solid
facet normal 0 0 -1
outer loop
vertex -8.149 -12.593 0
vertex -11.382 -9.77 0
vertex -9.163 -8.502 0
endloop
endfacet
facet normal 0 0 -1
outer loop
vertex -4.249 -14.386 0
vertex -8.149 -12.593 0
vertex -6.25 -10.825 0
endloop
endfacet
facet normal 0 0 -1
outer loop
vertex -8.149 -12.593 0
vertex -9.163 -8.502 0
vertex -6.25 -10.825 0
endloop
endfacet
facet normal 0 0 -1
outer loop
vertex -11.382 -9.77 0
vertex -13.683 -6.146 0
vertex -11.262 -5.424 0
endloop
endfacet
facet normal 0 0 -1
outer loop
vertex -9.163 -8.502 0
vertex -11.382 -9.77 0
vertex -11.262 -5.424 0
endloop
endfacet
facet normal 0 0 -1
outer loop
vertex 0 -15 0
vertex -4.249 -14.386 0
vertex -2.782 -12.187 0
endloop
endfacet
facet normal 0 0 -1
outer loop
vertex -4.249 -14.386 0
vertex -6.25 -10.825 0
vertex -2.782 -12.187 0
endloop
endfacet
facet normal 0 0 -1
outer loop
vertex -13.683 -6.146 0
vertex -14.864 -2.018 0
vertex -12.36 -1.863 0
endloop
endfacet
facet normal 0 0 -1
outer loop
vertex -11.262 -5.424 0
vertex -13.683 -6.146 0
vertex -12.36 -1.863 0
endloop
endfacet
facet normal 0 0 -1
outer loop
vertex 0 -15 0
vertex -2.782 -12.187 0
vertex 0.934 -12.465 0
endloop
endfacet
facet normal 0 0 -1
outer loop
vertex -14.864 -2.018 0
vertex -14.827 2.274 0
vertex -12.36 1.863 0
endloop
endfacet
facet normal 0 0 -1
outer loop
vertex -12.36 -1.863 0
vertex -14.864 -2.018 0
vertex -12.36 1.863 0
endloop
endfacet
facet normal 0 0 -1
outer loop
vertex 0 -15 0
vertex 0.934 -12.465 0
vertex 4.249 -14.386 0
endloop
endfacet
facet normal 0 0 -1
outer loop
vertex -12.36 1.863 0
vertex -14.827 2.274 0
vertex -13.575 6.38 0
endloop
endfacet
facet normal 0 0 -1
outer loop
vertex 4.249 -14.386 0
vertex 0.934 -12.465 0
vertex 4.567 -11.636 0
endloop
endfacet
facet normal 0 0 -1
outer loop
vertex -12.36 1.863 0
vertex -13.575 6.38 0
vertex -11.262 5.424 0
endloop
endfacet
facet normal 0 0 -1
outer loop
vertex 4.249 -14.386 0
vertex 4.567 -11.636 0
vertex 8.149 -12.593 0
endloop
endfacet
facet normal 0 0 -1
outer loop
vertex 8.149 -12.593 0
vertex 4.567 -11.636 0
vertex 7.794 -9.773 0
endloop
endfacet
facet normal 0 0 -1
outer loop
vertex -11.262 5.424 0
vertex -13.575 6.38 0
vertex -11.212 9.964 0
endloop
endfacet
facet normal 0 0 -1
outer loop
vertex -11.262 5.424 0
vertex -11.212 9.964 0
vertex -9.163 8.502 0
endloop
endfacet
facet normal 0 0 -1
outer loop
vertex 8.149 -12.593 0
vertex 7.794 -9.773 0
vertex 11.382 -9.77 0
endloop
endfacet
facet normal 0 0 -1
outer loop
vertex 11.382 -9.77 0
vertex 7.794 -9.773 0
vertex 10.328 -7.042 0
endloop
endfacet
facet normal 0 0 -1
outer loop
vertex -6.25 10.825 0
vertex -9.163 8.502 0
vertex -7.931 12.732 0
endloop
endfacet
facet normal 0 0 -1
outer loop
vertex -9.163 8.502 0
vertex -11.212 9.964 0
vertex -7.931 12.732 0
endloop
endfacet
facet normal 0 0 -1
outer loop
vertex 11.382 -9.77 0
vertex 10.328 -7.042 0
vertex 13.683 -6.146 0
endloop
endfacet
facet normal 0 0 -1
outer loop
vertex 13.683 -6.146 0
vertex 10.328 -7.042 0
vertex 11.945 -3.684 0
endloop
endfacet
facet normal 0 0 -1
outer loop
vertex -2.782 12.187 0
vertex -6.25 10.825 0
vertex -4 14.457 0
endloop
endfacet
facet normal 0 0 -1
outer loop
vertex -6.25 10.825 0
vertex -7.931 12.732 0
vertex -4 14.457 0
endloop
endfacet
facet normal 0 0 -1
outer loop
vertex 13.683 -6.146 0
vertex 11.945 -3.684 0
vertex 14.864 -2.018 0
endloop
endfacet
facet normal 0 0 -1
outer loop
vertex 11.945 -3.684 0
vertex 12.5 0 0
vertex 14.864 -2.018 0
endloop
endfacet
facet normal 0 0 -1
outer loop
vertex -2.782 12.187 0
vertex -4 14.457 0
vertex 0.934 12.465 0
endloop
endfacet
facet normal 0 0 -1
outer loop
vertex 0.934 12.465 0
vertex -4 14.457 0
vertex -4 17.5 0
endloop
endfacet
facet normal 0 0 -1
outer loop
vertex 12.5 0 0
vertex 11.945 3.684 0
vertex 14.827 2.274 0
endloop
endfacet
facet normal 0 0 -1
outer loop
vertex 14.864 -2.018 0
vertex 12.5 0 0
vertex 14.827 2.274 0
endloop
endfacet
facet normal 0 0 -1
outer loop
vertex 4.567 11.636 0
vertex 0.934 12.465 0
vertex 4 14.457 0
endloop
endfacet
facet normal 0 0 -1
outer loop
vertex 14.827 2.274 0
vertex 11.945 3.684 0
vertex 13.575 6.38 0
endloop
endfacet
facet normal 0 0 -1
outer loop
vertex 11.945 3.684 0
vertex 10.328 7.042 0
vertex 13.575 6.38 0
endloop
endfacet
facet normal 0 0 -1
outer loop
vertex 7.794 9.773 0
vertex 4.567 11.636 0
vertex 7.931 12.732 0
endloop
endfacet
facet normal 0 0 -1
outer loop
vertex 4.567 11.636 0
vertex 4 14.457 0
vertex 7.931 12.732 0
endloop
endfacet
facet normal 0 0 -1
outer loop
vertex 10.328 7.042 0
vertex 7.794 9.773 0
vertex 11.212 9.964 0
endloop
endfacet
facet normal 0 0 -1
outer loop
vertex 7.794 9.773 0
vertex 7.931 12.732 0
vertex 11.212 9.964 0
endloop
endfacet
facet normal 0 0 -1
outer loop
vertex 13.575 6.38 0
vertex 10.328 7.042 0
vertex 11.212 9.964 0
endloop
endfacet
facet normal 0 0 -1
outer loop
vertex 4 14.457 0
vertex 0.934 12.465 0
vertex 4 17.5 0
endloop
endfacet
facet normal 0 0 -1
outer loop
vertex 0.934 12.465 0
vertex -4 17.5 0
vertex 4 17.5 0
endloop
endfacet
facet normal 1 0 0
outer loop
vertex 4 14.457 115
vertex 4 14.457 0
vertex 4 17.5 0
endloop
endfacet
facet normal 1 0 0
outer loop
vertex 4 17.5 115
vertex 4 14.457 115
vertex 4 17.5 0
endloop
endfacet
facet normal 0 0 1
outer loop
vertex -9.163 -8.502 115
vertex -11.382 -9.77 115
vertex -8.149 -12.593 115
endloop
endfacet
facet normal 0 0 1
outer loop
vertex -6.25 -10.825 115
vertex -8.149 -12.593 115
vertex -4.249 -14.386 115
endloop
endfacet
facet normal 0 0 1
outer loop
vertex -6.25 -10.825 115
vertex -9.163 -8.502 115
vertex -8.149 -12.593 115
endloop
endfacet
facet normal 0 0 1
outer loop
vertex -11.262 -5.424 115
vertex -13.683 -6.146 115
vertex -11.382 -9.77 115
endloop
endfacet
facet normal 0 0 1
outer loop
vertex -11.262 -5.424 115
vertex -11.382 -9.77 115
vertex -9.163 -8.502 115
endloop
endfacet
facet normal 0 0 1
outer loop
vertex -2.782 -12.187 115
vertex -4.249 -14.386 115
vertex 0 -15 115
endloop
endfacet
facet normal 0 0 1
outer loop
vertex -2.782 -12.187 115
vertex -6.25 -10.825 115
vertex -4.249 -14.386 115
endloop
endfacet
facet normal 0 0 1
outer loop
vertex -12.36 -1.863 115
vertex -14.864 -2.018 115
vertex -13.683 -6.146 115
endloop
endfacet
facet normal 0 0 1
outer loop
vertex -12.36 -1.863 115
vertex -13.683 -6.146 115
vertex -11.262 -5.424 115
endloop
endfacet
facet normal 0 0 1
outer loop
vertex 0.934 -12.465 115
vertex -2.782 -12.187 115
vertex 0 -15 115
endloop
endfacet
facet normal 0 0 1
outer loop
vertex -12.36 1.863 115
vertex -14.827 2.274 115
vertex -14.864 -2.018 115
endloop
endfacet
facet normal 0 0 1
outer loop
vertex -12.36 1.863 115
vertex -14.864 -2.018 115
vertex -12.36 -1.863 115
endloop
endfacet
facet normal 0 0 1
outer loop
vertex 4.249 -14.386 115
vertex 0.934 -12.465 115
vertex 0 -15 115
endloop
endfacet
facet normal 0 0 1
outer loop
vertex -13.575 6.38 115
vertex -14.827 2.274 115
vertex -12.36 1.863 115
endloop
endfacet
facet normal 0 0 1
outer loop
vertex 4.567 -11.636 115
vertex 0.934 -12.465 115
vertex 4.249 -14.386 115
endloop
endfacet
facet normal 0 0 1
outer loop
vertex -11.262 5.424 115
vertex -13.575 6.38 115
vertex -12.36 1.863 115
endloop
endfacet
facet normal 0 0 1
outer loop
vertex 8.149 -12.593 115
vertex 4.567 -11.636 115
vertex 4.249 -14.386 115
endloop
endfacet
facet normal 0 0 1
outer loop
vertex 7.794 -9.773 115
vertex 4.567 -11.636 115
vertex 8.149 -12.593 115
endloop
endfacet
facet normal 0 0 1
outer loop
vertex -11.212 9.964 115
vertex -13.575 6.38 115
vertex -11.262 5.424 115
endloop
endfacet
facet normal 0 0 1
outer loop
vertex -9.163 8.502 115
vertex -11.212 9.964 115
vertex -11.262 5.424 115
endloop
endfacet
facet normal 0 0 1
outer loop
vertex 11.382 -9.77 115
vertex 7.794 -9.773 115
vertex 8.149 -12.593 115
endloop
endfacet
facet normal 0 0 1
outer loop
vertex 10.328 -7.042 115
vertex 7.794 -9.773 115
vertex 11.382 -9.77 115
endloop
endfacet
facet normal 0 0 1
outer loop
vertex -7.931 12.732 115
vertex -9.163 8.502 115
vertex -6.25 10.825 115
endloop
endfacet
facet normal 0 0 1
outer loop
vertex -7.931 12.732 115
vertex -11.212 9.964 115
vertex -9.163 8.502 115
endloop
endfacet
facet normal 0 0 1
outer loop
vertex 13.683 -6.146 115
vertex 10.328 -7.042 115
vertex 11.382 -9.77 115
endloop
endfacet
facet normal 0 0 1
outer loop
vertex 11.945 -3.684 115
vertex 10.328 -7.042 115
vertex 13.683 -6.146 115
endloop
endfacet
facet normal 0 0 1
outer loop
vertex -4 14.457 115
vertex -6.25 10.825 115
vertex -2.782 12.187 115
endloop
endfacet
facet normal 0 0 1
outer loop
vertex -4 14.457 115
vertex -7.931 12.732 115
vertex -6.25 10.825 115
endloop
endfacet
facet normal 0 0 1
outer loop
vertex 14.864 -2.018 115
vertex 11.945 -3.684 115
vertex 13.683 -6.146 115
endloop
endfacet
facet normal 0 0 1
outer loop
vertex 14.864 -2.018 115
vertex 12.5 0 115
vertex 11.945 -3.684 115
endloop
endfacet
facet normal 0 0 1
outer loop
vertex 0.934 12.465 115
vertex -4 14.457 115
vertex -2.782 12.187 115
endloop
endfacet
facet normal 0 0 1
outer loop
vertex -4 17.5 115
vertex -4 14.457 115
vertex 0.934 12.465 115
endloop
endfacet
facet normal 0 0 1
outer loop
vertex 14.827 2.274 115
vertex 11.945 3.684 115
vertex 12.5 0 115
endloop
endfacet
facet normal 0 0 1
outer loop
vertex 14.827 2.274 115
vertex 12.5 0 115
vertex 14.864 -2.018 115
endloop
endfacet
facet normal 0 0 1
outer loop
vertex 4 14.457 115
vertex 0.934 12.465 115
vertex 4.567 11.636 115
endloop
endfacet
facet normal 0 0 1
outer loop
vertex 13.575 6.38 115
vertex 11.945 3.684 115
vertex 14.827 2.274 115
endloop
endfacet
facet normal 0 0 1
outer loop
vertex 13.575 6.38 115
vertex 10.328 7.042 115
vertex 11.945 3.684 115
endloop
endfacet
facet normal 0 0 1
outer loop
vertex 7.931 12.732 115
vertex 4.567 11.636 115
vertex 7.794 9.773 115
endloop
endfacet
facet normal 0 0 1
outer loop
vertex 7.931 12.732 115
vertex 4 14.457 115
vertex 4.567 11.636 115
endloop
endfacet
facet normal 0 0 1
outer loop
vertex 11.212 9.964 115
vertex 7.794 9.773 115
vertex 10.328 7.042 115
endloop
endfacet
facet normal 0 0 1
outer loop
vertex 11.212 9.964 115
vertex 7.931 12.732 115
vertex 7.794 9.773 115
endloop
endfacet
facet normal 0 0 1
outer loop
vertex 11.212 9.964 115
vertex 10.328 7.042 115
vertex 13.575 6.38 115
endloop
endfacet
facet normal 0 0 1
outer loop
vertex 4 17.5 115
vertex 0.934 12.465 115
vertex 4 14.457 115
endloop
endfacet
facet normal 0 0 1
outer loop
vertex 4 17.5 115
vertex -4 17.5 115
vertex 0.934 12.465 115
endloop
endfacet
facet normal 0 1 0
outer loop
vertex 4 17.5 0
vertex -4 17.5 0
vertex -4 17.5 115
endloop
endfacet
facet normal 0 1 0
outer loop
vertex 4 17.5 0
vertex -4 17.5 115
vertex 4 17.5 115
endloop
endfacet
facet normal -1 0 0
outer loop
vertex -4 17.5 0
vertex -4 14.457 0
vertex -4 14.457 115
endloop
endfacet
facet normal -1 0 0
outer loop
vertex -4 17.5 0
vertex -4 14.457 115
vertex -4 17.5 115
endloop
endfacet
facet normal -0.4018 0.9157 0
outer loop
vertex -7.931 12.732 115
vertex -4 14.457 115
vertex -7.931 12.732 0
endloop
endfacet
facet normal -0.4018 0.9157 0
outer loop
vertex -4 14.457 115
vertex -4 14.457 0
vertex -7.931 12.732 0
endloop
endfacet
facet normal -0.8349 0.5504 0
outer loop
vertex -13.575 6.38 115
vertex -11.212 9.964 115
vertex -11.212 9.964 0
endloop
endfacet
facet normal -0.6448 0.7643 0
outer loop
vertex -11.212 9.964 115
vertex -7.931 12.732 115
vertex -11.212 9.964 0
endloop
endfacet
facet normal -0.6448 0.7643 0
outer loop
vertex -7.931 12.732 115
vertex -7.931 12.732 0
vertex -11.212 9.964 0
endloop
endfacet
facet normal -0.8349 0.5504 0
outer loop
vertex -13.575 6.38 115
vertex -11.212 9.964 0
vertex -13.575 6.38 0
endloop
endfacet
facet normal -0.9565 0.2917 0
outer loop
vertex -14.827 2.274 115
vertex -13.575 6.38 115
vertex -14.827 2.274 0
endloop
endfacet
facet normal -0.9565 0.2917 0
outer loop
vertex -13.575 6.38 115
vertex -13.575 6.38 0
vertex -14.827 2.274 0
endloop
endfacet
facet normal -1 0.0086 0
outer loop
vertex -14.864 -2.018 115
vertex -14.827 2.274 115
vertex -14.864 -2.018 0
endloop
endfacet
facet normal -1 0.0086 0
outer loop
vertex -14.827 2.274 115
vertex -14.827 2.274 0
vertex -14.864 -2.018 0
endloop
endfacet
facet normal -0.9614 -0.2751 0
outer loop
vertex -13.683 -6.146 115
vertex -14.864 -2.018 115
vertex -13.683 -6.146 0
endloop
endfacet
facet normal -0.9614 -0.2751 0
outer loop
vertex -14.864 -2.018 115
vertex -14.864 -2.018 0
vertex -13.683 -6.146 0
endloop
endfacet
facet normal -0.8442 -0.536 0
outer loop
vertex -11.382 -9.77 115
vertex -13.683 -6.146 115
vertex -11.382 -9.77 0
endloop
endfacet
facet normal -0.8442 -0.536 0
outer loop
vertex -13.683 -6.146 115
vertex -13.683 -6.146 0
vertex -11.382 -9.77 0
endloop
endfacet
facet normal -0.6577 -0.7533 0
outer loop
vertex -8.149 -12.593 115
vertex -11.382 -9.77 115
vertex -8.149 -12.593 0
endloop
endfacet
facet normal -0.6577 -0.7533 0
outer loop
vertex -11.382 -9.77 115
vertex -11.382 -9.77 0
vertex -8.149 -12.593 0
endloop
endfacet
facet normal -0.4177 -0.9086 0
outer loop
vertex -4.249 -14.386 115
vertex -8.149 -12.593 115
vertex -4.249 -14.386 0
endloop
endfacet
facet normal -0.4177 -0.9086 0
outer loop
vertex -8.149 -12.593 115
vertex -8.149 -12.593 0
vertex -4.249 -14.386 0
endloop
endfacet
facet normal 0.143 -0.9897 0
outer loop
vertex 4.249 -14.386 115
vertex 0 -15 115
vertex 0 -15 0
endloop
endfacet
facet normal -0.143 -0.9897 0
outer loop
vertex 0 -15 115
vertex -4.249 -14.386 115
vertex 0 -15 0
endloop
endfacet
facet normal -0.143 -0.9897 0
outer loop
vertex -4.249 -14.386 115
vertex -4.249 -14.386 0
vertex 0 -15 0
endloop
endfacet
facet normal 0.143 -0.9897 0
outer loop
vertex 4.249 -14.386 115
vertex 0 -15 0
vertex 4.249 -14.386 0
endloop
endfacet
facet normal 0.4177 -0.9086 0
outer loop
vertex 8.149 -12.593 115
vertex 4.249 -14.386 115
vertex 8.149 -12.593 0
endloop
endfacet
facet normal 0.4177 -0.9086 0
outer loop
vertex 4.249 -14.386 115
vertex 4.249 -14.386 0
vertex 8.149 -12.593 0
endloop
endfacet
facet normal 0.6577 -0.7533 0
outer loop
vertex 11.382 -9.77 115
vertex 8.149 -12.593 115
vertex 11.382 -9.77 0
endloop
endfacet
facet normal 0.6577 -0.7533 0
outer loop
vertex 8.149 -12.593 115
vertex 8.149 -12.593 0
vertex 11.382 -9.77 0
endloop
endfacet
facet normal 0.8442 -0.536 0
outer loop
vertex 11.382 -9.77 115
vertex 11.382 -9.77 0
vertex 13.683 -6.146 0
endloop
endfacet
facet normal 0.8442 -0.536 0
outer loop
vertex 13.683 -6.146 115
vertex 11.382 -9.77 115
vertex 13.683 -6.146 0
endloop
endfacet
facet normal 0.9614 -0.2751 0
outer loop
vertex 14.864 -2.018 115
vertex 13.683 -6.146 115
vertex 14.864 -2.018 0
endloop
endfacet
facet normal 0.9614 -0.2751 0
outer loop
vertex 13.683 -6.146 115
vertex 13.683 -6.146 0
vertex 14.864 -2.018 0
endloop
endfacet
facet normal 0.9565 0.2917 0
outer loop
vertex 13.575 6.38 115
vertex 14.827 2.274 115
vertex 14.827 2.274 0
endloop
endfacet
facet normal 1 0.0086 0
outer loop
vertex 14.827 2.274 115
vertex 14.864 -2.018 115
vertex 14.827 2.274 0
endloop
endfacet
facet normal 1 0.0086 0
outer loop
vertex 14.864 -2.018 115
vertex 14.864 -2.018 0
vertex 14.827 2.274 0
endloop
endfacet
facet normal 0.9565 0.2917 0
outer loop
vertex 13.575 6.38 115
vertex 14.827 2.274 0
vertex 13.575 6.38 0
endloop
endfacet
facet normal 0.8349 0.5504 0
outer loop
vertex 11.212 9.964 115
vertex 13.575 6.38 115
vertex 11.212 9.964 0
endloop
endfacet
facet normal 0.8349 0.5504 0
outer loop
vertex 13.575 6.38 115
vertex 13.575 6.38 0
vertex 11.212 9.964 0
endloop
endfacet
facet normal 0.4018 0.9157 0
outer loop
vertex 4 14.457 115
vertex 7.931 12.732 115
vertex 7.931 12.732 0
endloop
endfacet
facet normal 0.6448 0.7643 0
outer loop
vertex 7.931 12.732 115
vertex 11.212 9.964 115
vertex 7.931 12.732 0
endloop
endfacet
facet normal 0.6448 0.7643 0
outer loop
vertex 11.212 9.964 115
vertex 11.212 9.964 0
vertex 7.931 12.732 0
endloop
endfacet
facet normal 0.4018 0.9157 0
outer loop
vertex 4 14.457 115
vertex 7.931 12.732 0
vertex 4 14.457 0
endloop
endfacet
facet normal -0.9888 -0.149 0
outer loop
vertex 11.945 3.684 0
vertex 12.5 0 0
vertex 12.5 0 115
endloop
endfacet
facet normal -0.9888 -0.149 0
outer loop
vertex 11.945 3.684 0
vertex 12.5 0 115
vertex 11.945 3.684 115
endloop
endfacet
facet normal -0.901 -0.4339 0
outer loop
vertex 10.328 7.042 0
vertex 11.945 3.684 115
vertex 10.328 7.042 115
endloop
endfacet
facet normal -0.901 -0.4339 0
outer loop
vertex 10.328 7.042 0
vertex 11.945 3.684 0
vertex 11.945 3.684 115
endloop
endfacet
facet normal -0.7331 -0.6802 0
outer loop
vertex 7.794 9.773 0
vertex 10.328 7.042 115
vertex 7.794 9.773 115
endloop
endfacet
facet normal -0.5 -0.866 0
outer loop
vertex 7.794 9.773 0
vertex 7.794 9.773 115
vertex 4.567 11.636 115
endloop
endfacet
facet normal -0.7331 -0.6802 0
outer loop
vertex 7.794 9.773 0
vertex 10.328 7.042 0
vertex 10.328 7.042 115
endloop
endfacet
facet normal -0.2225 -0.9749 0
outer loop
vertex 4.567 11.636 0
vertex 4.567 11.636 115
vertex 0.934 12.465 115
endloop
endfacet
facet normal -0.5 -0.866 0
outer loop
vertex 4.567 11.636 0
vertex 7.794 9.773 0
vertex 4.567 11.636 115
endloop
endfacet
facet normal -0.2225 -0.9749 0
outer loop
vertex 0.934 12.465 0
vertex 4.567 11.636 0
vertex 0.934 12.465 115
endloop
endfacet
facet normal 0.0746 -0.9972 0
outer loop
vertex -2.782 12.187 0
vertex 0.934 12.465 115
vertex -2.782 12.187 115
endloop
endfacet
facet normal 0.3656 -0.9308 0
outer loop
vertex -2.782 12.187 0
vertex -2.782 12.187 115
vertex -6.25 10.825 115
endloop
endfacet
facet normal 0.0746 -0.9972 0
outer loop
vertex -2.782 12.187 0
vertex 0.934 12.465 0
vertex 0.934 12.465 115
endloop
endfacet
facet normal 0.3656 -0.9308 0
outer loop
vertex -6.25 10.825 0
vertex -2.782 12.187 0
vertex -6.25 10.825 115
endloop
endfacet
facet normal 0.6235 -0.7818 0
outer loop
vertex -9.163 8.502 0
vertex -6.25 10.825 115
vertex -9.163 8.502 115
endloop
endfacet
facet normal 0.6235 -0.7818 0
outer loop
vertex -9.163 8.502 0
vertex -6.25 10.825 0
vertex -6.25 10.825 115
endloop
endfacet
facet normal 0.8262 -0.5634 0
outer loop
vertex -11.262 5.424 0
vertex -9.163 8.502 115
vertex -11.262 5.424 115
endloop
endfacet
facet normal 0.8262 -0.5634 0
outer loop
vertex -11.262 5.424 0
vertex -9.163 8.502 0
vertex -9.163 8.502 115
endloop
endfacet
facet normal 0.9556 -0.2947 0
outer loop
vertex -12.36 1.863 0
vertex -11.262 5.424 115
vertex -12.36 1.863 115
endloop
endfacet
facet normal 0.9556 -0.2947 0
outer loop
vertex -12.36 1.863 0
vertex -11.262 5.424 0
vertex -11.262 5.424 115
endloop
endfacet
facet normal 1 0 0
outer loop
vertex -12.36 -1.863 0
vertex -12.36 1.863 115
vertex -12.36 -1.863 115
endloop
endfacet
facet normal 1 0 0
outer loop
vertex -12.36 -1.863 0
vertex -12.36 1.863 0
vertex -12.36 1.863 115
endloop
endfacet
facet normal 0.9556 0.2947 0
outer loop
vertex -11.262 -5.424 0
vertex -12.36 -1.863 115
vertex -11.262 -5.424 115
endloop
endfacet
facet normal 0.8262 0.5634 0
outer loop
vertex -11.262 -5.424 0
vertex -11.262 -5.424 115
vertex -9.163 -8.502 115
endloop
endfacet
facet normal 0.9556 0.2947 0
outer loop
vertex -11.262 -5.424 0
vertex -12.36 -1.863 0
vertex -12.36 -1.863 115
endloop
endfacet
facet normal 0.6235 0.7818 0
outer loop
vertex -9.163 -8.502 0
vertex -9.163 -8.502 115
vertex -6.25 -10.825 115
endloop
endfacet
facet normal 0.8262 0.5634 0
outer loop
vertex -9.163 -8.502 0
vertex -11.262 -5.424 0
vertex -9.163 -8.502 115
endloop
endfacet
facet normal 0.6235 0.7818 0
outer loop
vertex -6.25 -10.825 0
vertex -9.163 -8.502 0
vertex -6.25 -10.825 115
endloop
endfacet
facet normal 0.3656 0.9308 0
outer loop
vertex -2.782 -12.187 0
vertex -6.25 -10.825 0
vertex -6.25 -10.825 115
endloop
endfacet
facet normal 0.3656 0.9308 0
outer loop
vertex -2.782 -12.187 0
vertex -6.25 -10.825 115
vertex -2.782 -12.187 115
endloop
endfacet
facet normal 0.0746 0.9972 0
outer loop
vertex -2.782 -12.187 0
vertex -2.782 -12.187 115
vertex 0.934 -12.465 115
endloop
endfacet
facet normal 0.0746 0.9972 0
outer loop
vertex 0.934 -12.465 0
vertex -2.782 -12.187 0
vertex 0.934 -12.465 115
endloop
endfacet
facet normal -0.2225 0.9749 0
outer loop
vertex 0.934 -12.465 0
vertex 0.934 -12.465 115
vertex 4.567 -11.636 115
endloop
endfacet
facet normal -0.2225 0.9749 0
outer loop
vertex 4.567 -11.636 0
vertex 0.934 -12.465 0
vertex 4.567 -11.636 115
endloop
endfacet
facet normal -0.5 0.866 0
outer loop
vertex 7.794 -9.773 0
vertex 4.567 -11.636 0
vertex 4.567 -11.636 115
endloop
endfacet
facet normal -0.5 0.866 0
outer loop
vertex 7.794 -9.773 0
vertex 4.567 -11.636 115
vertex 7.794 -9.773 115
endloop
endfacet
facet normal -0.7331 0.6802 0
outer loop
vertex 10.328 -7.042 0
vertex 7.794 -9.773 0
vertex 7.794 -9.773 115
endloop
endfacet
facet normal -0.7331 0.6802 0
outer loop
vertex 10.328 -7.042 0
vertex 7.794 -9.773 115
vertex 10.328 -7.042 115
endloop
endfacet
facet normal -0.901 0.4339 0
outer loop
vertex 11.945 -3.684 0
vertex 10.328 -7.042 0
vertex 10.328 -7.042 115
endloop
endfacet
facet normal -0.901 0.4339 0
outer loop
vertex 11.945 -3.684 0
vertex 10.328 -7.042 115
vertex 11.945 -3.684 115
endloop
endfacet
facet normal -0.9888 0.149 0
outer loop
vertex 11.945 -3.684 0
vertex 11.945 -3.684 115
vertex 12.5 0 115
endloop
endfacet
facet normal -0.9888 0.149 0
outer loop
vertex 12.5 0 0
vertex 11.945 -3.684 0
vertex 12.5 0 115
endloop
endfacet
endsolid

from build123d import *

# Parameters (mm, degrees)
SKETCH1_R           = 15
SKETCH1_R_2         = 12.5
BOSS_EXTRUDE1_DEPTH = 115
SKETCH2_W           = 8
SKETCH2_H           = 5
BOSS_EXTRUDE2_DEPTH = 115


with BuildPart() as part:
    # Sketch1 → Boss-Extrude1 (new body)
    with BuildSketch(Plane.XY):
        Circle(SKETCH1_R)
        Circle(SKETCH1_R_2, mode=Mode.SUBTRACT)
    extrude(amount=BOSS_EXTRUDE1_DEPTH)

    # Sketch2 → Boss-Extrude2 (add)
    with BuildSketch(Plane.XY):
        with Locations((0, 15)):
            Rectangle(SKETCH2_W, SKETCH2_H)
    extrude(amount=BOSS_EXTRUDE2_DEPTH)


solid = part.part
